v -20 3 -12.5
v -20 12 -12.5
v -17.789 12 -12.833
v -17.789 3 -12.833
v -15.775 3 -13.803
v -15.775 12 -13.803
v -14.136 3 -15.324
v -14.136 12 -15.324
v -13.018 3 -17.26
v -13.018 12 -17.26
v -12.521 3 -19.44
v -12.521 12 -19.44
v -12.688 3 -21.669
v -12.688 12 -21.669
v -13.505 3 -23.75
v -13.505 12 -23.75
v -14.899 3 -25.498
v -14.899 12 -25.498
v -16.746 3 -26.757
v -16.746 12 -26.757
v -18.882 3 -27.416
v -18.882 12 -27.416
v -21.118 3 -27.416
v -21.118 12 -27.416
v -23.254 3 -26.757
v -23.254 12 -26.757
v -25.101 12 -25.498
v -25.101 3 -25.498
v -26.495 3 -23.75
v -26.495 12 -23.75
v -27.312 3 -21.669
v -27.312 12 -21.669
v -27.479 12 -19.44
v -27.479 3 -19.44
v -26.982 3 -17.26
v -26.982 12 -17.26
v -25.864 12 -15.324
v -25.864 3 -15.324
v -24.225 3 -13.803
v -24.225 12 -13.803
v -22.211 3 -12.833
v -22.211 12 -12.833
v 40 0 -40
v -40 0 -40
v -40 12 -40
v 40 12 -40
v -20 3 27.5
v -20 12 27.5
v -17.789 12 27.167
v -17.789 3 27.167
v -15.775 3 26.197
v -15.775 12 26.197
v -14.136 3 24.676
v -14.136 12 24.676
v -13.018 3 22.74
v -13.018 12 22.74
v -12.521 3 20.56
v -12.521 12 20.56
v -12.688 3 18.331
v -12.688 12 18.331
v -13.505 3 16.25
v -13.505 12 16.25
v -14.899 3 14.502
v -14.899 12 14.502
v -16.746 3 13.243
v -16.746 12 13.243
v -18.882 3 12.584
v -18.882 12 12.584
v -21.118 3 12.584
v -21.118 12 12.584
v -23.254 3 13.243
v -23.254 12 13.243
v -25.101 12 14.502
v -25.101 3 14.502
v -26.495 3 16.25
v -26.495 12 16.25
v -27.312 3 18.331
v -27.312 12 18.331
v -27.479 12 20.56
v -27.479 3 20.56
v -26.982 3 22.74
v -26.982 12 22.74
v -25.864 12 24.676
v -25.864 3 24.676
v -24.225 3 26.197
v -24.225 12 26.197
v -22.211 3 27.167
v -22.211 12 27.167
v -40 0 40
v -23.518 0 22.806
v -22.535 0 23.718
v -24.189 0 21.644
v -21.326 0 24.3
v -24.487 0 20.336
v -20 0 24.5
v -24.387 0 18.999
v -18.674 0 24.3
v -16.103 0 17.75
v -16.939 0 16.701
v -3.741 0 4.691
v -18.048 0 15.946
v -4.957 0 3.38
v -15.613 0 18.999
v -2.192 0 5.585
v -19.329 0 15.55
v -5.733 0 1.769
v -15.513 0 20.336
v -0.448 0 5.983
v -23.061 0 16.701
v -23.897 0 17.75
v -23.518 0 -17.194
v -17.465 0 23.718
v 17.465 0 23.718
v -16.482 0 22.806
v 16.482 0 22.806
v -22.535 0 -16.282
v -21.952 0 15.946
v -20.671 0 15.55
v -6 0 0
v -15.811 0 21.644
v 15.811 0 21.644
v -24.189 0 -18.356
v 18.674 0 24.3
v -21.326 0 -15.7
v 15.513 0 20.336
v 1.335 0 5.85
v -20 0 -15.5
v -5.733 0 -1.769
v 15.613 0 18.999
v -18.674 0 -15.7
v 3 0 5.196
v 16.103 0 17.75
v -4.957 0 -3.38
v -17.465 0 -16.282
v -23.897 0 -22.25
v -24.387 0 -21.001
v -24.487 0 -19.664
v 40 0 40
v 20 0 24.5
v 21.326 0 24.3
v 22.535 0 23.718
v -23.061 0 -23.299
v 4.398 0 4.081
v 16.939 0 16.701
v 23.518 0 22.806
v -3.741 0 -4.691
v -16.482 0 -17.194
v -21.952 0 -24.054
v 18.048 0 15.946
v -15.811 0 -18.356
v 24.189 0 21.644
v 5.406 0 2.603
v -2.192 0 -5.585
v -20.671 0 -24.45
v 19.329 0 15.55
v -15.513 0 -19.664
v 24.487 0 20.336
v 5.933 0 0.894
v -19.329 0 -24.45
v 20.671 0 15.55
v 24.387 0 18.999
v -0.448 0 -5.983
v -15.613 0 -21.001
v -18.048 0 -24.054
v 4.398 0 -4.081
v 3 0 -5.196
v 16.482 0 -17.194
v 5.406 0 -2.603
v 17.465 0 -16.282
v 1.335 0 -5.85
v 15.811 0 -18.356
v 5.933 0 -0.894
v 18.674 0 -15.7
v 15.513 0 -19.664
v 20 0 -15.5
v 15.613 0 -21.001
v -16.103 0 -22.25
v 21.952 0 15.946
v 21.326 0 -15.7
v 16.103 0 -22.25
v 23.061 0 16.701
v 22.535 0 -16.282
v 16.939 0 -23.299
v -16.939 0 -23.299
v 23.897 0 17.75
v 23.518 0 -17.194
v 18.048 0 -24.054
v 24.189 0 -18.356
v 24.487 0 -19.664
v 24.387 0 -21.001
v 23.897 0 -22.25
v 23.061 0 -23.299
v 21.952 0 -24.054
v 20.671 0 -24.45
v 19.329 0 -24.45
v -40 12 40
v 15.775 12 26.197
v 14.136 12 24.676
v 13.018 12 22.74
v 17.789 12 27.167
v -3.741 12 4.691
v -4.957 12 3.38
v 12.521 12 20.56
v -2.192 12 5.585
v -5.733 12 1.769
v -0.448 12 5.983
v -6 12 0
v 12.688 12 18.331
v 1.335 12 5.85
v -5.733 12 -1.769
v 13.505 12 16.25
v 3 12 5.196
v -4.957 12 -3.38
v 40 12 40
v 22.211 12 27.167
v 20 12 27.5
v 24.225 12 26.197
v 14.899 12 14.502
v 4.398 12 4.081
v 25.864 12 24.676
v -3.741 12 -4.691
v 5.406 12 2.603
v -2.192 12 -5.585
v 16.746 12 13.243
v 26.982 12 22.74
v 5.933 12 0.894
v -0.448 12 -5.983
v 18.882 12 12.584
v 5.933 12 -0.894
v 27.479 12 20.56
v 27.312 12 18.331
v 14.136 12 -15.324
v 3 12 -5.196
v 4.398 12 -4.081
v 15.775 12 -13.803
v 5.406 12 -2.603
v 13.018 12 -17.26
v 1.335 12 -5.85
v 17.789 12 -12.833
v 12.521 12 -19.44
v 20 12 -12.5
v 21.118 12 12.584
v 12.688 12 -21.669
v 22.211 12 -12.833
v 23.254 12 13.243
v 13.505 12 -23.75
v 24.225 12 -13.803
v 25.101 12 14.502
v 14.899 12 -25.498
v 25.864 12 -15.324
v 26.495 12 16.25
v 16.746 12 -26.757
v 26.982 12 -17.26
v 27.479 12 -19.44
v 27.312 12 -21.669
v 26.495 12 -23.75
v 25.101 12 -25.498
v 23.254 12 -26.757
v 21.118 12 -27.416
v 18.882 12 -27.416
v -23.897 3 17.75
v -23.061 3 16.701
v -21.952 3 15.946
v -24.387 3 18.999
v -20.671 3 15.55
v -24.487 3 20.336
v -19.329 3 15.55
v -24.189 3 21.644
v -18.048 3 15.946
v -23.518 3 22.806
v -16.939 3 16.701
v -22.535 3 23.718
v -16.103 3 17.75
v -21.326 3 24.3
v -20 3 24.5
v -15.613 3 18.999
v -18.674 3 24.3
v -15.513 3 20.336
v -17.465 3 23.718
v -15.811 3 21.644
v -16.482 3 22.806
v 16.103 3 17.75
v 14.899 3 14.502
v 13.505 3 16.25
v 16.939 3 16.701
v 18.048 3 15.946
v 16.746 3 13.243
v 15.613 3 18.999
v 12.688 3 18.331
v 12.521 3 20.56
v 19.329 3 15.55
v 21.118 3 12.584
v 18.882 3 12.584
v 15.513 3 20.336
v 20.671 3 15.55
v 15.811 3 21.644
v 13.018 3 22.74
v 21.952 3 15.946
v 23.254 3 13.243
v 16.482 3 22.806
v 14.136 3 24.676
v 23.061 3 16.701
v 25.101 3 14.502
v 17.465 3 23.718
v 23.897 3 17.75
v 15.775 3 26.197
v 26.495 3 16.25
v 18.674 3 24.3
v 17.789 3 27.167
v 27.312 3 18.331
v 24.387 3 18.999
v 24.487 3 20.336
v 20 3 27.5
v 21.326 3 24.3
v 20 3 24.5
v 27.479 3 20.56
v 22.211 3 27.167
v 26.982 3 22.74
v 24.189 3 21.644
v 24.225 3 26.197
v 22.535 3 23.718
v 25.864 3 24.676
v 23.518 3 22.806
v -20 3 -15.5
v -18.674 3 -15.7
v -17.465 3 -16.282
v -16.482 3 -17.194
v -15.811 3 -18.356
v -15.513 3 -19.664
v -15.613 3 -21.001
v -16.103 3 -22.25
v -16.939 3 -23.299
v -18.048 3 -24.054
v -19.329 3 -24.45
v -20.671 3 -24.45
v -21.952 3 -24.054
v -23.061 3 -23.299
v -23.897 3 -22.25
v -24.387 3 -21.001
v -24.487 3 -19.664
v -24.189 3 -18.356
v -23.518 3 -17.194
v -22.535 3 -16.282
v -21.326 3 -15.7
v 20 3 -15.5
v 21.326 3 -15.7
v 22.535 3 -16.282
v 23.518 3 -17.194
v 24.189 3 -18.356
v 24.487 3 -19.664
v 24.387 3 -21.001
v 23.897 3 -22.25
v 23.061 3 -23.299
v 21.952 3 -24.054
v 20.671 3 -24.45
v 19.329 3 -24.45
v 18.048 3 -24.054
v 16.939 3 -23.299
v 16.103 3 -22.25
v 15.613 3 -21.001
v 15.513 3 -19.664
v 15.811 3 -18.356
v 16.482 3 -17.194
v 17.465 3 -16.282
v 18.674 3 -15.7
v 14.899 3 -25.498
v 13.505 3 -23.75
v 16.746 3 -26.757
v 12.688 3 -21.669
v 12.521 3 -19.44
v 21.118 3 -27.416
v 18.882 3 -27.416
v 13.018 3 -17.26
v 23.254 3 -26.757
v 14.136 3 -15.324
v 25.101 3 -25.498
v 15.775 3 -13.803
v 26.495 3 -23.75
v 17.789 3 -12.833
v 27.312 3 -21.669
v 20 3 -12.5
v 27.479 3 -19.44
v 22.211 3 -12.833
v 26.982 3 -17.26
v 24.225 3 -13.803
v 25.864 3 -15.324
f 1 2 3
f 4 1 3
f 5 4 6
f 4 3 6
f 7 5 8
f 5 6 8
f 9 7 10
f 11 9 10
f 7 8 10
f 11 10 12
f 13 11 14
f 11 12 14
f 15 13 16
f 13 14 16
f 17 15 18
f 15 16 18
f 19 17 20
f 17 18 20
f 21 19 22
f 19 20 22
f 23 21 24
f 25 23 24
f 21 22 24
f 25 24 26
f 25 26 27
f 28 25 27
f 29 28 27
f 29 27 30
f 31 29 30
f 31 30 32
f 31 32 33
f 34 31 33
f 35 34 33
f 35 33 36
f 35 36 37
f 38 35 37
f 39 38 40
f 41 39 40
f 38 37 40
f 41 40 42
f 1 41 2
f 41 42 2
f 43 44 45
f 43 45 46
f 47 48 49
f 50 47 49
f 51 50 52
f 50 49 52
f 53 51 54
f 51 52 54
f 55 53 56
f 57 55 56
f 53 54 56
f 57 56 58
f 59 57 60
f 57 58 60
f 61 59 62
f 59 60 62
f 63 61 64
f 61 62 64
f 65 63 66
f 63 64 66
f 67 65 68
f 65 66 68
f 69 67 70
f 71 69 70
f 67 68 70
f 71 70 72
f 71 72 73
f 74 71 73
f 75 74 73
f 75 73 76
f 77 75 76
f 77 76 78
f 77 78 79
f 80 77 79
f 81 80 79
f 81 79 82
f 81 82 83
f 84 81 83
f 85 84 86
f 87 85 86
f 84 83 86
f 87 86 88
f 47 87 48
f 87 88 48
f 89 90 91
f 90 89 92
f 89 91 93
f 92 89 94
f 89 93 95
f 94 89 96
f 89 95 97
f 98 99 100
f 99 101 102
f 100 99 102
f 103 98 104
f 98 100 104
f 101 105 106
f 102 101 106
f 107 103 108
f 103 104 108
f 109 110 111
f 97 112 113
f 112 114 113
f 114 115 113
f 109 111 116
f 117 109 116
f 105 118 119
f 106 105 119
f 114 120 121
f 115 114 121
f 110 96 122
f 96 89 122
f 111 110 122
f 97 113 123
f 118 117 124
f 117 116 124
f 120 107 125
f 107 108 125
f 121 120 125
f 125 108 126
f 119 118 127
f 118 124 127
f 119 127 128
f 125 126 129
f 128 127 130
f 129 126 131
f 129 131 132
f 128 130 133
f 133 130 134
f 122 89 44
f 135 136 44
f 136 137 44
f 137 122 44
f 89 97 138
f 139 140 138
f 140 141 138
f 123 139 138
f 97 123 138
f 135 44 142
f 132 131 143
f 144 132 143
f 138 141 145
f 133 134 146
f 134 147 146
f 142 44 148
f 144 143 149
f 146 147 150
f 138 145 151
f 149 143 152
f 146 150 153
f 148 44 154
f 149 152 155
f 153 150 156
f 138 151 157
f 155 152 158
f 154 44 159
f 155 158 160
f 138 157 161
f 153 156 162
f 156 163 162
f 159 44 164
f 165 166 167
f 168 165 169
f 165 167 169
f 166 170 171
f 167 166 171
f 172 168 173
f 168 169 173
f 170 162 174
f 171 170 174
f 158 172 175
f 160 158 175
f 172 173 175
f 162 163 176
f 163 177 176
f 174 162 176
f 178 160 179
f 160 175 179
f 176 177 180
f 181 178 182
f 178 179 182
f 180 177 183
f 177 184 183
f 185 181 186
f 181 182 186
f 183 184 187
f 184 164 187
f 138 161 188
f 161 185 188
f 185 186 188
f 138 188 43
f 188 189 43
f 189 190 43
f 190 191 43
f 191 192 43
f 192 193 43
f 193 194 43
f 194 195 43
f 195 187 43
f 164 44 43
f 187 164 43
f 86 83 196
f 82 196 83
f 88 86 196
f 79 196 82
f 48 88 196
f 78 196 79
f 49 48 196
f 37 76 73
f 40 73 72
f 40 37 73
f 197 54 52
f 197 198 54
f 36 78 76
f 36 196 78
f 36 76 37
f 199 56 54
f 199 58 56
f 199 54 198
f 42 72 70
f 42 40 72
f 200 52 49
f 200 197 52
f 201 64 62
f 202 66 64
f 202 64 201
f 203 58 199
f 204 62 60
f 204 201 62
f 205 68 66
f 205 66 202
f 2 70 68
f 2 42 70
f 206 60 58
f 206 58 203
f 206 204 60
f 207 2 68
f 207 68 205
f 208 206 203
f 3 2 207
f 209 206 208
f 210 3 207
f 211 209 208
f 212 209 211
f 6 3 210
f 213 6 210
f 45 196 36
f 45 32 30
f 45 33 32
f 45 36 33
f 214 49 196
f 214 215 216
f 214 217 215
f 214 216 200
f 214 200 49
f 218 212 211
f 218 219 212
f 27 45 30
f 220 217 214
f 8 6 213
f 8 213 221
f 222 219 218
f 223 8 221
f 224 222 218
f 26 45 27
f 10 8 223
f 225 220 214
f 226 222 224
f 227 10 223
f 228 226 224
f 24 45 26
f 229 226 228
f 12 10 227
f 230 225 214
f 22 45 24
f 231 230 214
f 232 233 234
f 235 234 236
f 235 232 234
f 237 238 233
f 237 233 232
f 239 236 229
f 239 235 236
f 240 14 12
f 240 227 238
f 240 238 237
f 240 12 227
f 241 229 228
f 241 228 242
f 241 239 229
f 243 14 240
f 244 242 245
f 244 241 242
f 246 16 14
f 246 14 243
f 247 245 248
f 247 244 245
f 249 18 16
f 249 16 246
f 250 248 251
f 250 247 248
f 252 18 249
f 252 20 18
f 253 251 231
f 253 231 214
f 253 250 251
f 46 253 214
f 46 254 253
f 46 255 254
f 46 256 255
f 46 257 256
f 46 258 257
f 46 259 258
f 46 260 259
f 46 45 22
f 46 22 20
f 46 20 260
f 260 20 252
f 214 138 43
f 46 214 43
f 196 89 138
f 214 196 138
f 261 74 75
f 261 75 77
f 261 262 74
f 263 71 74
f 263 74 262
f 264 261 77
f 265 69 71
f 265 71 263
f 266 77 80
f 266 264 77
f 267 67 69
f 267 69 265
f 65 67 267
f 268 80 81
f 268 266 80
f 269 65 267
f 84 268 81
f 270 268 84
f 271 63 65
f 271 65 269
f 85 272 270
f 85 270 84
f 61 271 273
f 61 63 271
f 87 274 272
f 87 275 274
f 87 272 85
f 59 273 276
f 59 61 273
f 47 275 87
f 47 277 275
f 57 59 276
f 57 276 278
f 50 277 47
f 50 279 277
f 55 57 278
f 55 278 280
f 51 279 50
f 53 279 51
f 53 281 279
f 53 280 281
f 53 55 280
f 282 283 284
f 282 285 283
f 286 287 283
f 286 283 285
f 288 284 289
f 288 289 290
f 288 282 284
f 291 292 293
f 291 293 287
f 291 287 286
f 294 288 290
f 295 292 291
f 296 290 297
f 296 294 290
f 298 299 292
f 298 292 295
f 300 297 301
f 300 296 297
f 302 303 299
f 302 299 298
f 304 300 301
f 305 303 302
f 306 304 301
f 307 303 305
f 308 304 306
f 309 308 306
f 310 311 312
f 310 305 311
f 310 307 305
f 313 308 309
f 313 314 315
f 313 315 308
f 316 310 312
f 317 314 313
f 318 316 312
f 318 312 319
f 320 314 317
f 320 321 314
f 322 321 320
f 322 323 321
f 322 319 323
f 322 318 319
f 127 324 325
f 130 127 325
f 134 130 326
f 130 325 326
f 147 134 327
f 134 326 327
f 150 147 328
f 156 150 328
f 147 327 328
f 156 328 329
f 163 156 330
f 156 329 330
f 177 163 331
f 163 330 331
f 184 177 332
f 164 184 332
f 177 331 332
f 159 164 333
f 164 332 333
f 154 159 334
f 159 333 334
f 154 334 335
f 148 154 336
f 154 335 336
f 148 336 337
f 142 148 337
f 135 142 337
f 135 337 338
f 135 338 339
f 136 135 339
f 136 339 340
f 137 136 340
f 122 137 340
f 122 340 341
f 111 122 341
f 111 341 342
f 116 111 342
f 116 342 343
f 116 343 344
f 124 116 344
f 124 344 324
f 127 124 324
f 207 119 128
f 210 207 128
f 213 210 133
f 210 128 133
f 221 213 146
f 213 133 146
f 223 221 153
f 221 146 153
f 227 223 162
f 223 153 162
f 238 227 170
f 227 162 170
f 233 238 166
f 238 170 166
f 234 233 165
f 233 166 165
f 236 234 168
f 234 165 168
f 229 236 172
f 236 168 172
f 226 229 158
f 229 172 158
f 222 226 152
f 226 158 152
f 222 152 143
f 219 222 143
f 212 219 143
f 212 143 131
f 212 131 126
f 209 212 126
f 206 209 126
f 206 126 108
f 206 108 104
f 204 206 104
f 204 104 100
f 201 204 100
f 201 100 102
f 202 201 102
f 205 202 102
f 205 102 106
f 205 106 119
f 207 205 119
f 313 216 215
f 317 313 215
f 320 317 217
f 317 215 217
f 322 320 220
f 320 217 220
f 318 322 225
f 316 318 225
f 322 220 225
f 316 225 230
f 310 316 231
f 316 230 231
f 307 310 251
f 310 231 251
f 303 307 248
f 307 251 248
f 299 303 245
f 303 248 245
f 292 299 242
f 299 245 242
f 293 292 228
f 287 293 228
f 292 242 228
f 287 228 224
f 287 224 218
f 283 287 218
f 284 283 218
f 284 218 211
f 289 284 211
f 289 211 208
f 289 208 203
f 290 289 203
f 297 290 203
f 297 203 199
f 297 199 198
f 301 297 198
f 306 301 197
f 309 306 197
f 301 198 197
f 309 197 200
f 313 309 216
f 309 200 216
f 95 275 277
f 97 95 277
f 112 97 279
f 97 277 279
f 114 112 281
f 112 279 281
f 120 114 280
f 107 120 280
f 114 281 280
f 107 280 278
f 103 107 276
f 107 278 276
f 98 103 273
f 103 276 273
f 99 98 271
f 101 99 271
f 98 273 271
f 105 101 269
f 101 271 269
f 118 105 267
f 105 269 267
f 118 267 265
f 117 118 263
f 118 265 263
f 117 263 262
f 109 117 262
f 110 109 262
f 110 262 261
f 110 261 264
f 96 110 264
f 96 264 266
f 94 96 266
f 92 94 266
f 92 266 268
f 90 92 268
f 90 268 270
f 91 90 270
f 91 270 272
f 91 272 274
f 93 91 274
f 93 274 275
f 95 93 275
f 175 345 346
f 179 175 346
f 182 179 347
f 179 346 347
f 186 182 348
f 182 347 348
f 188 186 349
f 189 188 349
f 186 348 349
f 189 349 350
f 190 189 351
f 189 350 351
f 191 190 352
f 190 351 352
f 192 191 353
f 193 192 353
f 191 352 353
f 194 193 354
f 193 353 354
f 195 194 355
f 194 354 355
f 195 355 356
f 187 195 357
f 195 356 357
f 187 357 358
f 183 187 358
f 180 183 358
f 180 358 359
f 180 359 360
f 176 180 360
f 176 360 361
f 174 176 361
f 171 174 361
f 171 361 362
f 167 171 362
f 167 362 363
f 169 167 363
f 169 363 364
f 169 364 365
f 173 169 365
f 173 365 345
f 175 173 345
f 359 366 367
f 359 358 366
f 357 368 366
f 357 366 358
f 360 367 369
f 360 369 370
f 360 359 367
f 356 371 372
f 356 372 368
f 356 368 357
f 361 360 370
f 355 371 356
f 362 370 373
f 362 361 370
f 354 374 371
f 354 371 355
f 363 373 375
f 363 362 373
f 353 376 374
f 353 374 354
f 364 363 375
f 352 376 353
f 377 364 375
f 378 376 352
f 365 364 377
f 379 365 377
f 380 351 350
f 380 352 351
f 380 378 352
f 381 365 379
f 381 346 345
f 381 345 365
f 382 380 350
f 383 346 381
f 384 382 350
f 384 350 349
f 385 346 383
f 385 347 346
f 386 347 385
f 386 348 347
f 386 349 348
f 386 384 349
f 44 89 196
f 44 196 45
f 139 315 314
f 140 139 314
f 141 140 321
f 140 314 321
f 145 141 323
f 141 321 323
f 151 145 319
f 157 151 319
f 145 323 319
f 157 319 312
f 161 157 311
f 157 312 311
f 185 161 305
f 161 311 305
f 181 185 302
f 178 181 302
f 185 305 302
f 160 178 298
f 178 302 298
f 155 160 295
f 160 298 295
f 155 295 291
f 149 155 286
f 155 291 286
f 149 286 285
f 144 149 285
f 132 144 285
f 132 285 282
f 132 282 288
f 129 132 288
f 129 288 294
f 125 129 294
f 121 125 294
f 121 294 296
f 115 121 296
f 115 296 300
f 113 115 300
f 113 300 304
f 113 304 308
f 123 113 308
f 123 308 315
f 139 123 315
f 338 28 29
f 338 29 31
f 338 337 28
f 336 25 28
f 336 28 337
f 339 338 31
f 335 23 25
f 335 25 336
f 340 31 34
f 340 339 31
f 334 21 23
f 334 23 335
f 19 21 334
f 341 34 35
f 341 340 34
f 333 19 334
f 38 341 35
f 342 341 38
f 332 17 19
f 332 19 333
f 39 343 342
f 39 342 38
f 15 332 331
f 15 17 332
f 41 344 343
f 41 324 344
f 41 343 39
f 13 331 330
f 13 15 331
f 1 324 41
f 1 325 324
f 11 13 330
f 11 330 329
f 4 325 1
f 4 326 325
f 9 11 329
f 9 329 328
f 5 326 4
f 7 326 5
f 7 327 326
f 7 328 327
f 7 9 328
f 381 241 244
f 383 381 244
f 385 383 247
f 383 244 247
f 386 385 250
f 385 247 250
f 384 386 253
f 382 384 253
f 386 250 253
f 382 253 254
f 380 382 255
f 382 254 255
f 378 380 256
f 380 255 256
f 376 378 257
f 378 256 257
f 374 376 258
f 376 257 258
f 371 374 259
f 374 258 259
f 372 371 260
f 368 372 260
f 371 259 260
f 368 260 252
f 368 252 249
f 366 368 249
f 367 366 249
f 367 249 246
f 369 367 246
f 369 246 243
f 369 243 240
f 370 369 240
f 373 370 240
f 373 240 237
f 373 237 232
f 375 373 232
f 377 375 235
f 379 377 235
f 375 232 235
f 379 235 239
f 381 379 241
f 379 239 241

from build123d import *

# Parameters (mm, degrees)
SKETCH_1_W             = 80
SKETCH_1_H             = 80
EXTRUDE_1_DEPTH        = 12
HOLE_WIZARD_M141_D     = 12
HOLE_WIZARD_M141_DEPTH = 12
SKETCH_12_R            = 4.5
CUT_EXTRUDE_1_DEPTH    = 13
SKETCH_13_R            = 7.5
CUT_EXTRUDE_2_DEPTH    = 9


with BuildPart() as part:
    # Эскиз1 → Бобышка-Вытянуть1 (new body)
    with BuildSketch(Plane(origin=(0, 0, 0), x_dir=(1, 0, 0), z_dir=(0, 1, 0))):
        Rectangle(SKETCH_1_W, SKETCH_1_H)
    extrude(amount=EXTRUDE_1_DEPTH)

    # Отверстие обработанное метчиком M141
    with Locations(Plane(origin=(0, 12, 0), x_dir=(1, 0, 0), z_dir=(0, 1, 0))):
        with Locations((0, 0)):
            Hole(HOLE_WIZARD_M141_D / 2, depth=HOLE_WIZARD_M141_DEPTH)

    # Эскиз12 → Вырез-Вытянуть1 (cut, through all)
    with BuildSketch(Plane(origin=(0, 12, 0), x_dir=(1, 0, 0), z_dir=(0, 1, 0))):
        with Locations(Location((-20, 20, 0), (0, 0, 270))):  # turned: the seam where the file's is
            Circle(SKETCH_12_R)
        with Locations(Location((20, 20, 0), (0, 0, 270))):  # turned: the seam where the file's is
            Circle(SKETCH_12_R)
        with Locations(Location((20, -20, 0), (0, 0, 270))):  # turned: the seam where the file's is
            Circle(SKETCH_12_R)
        with Locations(Location((-20, -20, 0), (0, 0, 270))):  # turned: the seam where the file's is
            Circle(SKETCH_12_R)
    extrude(amount=-CUT_EXTRUDE_1_DEPTH, mode=Mode.SUBTRACT)

    # Эскиз13 → Вырез-Вытянуть2 (cut)
    with BuildSketch(Plane(origin=(0, 12, 0), x_dir=(1, 0, 0), z_dir=(0, 1, 0))):
        with Locations(Location((-20, 20, 0), (0, 0, 270))):  # turned: the seam where the file's is
            Circle(SKETCH_13_R)
        with Locations(Location((20, 20, 0), (0, 0, 270))):  # turned: the seam where the file's is
            Circle(SKETCH_13_R)
        with Locations(Location((20, -20, 0), (0, 0, 270))):  # turned: the seam where the file's is
            Circle(SKETCH_13_R)
        with Locations(Location((-20, -20, 0), (0, 0, 270))):  # turned: the seam where the file's is
            Circle(SKETCH_13_R)
    extrude(amount=-CUT_EXTRUDE_2_DEPTH, mode=Mode.SUBTRACT)


solid = part.part
